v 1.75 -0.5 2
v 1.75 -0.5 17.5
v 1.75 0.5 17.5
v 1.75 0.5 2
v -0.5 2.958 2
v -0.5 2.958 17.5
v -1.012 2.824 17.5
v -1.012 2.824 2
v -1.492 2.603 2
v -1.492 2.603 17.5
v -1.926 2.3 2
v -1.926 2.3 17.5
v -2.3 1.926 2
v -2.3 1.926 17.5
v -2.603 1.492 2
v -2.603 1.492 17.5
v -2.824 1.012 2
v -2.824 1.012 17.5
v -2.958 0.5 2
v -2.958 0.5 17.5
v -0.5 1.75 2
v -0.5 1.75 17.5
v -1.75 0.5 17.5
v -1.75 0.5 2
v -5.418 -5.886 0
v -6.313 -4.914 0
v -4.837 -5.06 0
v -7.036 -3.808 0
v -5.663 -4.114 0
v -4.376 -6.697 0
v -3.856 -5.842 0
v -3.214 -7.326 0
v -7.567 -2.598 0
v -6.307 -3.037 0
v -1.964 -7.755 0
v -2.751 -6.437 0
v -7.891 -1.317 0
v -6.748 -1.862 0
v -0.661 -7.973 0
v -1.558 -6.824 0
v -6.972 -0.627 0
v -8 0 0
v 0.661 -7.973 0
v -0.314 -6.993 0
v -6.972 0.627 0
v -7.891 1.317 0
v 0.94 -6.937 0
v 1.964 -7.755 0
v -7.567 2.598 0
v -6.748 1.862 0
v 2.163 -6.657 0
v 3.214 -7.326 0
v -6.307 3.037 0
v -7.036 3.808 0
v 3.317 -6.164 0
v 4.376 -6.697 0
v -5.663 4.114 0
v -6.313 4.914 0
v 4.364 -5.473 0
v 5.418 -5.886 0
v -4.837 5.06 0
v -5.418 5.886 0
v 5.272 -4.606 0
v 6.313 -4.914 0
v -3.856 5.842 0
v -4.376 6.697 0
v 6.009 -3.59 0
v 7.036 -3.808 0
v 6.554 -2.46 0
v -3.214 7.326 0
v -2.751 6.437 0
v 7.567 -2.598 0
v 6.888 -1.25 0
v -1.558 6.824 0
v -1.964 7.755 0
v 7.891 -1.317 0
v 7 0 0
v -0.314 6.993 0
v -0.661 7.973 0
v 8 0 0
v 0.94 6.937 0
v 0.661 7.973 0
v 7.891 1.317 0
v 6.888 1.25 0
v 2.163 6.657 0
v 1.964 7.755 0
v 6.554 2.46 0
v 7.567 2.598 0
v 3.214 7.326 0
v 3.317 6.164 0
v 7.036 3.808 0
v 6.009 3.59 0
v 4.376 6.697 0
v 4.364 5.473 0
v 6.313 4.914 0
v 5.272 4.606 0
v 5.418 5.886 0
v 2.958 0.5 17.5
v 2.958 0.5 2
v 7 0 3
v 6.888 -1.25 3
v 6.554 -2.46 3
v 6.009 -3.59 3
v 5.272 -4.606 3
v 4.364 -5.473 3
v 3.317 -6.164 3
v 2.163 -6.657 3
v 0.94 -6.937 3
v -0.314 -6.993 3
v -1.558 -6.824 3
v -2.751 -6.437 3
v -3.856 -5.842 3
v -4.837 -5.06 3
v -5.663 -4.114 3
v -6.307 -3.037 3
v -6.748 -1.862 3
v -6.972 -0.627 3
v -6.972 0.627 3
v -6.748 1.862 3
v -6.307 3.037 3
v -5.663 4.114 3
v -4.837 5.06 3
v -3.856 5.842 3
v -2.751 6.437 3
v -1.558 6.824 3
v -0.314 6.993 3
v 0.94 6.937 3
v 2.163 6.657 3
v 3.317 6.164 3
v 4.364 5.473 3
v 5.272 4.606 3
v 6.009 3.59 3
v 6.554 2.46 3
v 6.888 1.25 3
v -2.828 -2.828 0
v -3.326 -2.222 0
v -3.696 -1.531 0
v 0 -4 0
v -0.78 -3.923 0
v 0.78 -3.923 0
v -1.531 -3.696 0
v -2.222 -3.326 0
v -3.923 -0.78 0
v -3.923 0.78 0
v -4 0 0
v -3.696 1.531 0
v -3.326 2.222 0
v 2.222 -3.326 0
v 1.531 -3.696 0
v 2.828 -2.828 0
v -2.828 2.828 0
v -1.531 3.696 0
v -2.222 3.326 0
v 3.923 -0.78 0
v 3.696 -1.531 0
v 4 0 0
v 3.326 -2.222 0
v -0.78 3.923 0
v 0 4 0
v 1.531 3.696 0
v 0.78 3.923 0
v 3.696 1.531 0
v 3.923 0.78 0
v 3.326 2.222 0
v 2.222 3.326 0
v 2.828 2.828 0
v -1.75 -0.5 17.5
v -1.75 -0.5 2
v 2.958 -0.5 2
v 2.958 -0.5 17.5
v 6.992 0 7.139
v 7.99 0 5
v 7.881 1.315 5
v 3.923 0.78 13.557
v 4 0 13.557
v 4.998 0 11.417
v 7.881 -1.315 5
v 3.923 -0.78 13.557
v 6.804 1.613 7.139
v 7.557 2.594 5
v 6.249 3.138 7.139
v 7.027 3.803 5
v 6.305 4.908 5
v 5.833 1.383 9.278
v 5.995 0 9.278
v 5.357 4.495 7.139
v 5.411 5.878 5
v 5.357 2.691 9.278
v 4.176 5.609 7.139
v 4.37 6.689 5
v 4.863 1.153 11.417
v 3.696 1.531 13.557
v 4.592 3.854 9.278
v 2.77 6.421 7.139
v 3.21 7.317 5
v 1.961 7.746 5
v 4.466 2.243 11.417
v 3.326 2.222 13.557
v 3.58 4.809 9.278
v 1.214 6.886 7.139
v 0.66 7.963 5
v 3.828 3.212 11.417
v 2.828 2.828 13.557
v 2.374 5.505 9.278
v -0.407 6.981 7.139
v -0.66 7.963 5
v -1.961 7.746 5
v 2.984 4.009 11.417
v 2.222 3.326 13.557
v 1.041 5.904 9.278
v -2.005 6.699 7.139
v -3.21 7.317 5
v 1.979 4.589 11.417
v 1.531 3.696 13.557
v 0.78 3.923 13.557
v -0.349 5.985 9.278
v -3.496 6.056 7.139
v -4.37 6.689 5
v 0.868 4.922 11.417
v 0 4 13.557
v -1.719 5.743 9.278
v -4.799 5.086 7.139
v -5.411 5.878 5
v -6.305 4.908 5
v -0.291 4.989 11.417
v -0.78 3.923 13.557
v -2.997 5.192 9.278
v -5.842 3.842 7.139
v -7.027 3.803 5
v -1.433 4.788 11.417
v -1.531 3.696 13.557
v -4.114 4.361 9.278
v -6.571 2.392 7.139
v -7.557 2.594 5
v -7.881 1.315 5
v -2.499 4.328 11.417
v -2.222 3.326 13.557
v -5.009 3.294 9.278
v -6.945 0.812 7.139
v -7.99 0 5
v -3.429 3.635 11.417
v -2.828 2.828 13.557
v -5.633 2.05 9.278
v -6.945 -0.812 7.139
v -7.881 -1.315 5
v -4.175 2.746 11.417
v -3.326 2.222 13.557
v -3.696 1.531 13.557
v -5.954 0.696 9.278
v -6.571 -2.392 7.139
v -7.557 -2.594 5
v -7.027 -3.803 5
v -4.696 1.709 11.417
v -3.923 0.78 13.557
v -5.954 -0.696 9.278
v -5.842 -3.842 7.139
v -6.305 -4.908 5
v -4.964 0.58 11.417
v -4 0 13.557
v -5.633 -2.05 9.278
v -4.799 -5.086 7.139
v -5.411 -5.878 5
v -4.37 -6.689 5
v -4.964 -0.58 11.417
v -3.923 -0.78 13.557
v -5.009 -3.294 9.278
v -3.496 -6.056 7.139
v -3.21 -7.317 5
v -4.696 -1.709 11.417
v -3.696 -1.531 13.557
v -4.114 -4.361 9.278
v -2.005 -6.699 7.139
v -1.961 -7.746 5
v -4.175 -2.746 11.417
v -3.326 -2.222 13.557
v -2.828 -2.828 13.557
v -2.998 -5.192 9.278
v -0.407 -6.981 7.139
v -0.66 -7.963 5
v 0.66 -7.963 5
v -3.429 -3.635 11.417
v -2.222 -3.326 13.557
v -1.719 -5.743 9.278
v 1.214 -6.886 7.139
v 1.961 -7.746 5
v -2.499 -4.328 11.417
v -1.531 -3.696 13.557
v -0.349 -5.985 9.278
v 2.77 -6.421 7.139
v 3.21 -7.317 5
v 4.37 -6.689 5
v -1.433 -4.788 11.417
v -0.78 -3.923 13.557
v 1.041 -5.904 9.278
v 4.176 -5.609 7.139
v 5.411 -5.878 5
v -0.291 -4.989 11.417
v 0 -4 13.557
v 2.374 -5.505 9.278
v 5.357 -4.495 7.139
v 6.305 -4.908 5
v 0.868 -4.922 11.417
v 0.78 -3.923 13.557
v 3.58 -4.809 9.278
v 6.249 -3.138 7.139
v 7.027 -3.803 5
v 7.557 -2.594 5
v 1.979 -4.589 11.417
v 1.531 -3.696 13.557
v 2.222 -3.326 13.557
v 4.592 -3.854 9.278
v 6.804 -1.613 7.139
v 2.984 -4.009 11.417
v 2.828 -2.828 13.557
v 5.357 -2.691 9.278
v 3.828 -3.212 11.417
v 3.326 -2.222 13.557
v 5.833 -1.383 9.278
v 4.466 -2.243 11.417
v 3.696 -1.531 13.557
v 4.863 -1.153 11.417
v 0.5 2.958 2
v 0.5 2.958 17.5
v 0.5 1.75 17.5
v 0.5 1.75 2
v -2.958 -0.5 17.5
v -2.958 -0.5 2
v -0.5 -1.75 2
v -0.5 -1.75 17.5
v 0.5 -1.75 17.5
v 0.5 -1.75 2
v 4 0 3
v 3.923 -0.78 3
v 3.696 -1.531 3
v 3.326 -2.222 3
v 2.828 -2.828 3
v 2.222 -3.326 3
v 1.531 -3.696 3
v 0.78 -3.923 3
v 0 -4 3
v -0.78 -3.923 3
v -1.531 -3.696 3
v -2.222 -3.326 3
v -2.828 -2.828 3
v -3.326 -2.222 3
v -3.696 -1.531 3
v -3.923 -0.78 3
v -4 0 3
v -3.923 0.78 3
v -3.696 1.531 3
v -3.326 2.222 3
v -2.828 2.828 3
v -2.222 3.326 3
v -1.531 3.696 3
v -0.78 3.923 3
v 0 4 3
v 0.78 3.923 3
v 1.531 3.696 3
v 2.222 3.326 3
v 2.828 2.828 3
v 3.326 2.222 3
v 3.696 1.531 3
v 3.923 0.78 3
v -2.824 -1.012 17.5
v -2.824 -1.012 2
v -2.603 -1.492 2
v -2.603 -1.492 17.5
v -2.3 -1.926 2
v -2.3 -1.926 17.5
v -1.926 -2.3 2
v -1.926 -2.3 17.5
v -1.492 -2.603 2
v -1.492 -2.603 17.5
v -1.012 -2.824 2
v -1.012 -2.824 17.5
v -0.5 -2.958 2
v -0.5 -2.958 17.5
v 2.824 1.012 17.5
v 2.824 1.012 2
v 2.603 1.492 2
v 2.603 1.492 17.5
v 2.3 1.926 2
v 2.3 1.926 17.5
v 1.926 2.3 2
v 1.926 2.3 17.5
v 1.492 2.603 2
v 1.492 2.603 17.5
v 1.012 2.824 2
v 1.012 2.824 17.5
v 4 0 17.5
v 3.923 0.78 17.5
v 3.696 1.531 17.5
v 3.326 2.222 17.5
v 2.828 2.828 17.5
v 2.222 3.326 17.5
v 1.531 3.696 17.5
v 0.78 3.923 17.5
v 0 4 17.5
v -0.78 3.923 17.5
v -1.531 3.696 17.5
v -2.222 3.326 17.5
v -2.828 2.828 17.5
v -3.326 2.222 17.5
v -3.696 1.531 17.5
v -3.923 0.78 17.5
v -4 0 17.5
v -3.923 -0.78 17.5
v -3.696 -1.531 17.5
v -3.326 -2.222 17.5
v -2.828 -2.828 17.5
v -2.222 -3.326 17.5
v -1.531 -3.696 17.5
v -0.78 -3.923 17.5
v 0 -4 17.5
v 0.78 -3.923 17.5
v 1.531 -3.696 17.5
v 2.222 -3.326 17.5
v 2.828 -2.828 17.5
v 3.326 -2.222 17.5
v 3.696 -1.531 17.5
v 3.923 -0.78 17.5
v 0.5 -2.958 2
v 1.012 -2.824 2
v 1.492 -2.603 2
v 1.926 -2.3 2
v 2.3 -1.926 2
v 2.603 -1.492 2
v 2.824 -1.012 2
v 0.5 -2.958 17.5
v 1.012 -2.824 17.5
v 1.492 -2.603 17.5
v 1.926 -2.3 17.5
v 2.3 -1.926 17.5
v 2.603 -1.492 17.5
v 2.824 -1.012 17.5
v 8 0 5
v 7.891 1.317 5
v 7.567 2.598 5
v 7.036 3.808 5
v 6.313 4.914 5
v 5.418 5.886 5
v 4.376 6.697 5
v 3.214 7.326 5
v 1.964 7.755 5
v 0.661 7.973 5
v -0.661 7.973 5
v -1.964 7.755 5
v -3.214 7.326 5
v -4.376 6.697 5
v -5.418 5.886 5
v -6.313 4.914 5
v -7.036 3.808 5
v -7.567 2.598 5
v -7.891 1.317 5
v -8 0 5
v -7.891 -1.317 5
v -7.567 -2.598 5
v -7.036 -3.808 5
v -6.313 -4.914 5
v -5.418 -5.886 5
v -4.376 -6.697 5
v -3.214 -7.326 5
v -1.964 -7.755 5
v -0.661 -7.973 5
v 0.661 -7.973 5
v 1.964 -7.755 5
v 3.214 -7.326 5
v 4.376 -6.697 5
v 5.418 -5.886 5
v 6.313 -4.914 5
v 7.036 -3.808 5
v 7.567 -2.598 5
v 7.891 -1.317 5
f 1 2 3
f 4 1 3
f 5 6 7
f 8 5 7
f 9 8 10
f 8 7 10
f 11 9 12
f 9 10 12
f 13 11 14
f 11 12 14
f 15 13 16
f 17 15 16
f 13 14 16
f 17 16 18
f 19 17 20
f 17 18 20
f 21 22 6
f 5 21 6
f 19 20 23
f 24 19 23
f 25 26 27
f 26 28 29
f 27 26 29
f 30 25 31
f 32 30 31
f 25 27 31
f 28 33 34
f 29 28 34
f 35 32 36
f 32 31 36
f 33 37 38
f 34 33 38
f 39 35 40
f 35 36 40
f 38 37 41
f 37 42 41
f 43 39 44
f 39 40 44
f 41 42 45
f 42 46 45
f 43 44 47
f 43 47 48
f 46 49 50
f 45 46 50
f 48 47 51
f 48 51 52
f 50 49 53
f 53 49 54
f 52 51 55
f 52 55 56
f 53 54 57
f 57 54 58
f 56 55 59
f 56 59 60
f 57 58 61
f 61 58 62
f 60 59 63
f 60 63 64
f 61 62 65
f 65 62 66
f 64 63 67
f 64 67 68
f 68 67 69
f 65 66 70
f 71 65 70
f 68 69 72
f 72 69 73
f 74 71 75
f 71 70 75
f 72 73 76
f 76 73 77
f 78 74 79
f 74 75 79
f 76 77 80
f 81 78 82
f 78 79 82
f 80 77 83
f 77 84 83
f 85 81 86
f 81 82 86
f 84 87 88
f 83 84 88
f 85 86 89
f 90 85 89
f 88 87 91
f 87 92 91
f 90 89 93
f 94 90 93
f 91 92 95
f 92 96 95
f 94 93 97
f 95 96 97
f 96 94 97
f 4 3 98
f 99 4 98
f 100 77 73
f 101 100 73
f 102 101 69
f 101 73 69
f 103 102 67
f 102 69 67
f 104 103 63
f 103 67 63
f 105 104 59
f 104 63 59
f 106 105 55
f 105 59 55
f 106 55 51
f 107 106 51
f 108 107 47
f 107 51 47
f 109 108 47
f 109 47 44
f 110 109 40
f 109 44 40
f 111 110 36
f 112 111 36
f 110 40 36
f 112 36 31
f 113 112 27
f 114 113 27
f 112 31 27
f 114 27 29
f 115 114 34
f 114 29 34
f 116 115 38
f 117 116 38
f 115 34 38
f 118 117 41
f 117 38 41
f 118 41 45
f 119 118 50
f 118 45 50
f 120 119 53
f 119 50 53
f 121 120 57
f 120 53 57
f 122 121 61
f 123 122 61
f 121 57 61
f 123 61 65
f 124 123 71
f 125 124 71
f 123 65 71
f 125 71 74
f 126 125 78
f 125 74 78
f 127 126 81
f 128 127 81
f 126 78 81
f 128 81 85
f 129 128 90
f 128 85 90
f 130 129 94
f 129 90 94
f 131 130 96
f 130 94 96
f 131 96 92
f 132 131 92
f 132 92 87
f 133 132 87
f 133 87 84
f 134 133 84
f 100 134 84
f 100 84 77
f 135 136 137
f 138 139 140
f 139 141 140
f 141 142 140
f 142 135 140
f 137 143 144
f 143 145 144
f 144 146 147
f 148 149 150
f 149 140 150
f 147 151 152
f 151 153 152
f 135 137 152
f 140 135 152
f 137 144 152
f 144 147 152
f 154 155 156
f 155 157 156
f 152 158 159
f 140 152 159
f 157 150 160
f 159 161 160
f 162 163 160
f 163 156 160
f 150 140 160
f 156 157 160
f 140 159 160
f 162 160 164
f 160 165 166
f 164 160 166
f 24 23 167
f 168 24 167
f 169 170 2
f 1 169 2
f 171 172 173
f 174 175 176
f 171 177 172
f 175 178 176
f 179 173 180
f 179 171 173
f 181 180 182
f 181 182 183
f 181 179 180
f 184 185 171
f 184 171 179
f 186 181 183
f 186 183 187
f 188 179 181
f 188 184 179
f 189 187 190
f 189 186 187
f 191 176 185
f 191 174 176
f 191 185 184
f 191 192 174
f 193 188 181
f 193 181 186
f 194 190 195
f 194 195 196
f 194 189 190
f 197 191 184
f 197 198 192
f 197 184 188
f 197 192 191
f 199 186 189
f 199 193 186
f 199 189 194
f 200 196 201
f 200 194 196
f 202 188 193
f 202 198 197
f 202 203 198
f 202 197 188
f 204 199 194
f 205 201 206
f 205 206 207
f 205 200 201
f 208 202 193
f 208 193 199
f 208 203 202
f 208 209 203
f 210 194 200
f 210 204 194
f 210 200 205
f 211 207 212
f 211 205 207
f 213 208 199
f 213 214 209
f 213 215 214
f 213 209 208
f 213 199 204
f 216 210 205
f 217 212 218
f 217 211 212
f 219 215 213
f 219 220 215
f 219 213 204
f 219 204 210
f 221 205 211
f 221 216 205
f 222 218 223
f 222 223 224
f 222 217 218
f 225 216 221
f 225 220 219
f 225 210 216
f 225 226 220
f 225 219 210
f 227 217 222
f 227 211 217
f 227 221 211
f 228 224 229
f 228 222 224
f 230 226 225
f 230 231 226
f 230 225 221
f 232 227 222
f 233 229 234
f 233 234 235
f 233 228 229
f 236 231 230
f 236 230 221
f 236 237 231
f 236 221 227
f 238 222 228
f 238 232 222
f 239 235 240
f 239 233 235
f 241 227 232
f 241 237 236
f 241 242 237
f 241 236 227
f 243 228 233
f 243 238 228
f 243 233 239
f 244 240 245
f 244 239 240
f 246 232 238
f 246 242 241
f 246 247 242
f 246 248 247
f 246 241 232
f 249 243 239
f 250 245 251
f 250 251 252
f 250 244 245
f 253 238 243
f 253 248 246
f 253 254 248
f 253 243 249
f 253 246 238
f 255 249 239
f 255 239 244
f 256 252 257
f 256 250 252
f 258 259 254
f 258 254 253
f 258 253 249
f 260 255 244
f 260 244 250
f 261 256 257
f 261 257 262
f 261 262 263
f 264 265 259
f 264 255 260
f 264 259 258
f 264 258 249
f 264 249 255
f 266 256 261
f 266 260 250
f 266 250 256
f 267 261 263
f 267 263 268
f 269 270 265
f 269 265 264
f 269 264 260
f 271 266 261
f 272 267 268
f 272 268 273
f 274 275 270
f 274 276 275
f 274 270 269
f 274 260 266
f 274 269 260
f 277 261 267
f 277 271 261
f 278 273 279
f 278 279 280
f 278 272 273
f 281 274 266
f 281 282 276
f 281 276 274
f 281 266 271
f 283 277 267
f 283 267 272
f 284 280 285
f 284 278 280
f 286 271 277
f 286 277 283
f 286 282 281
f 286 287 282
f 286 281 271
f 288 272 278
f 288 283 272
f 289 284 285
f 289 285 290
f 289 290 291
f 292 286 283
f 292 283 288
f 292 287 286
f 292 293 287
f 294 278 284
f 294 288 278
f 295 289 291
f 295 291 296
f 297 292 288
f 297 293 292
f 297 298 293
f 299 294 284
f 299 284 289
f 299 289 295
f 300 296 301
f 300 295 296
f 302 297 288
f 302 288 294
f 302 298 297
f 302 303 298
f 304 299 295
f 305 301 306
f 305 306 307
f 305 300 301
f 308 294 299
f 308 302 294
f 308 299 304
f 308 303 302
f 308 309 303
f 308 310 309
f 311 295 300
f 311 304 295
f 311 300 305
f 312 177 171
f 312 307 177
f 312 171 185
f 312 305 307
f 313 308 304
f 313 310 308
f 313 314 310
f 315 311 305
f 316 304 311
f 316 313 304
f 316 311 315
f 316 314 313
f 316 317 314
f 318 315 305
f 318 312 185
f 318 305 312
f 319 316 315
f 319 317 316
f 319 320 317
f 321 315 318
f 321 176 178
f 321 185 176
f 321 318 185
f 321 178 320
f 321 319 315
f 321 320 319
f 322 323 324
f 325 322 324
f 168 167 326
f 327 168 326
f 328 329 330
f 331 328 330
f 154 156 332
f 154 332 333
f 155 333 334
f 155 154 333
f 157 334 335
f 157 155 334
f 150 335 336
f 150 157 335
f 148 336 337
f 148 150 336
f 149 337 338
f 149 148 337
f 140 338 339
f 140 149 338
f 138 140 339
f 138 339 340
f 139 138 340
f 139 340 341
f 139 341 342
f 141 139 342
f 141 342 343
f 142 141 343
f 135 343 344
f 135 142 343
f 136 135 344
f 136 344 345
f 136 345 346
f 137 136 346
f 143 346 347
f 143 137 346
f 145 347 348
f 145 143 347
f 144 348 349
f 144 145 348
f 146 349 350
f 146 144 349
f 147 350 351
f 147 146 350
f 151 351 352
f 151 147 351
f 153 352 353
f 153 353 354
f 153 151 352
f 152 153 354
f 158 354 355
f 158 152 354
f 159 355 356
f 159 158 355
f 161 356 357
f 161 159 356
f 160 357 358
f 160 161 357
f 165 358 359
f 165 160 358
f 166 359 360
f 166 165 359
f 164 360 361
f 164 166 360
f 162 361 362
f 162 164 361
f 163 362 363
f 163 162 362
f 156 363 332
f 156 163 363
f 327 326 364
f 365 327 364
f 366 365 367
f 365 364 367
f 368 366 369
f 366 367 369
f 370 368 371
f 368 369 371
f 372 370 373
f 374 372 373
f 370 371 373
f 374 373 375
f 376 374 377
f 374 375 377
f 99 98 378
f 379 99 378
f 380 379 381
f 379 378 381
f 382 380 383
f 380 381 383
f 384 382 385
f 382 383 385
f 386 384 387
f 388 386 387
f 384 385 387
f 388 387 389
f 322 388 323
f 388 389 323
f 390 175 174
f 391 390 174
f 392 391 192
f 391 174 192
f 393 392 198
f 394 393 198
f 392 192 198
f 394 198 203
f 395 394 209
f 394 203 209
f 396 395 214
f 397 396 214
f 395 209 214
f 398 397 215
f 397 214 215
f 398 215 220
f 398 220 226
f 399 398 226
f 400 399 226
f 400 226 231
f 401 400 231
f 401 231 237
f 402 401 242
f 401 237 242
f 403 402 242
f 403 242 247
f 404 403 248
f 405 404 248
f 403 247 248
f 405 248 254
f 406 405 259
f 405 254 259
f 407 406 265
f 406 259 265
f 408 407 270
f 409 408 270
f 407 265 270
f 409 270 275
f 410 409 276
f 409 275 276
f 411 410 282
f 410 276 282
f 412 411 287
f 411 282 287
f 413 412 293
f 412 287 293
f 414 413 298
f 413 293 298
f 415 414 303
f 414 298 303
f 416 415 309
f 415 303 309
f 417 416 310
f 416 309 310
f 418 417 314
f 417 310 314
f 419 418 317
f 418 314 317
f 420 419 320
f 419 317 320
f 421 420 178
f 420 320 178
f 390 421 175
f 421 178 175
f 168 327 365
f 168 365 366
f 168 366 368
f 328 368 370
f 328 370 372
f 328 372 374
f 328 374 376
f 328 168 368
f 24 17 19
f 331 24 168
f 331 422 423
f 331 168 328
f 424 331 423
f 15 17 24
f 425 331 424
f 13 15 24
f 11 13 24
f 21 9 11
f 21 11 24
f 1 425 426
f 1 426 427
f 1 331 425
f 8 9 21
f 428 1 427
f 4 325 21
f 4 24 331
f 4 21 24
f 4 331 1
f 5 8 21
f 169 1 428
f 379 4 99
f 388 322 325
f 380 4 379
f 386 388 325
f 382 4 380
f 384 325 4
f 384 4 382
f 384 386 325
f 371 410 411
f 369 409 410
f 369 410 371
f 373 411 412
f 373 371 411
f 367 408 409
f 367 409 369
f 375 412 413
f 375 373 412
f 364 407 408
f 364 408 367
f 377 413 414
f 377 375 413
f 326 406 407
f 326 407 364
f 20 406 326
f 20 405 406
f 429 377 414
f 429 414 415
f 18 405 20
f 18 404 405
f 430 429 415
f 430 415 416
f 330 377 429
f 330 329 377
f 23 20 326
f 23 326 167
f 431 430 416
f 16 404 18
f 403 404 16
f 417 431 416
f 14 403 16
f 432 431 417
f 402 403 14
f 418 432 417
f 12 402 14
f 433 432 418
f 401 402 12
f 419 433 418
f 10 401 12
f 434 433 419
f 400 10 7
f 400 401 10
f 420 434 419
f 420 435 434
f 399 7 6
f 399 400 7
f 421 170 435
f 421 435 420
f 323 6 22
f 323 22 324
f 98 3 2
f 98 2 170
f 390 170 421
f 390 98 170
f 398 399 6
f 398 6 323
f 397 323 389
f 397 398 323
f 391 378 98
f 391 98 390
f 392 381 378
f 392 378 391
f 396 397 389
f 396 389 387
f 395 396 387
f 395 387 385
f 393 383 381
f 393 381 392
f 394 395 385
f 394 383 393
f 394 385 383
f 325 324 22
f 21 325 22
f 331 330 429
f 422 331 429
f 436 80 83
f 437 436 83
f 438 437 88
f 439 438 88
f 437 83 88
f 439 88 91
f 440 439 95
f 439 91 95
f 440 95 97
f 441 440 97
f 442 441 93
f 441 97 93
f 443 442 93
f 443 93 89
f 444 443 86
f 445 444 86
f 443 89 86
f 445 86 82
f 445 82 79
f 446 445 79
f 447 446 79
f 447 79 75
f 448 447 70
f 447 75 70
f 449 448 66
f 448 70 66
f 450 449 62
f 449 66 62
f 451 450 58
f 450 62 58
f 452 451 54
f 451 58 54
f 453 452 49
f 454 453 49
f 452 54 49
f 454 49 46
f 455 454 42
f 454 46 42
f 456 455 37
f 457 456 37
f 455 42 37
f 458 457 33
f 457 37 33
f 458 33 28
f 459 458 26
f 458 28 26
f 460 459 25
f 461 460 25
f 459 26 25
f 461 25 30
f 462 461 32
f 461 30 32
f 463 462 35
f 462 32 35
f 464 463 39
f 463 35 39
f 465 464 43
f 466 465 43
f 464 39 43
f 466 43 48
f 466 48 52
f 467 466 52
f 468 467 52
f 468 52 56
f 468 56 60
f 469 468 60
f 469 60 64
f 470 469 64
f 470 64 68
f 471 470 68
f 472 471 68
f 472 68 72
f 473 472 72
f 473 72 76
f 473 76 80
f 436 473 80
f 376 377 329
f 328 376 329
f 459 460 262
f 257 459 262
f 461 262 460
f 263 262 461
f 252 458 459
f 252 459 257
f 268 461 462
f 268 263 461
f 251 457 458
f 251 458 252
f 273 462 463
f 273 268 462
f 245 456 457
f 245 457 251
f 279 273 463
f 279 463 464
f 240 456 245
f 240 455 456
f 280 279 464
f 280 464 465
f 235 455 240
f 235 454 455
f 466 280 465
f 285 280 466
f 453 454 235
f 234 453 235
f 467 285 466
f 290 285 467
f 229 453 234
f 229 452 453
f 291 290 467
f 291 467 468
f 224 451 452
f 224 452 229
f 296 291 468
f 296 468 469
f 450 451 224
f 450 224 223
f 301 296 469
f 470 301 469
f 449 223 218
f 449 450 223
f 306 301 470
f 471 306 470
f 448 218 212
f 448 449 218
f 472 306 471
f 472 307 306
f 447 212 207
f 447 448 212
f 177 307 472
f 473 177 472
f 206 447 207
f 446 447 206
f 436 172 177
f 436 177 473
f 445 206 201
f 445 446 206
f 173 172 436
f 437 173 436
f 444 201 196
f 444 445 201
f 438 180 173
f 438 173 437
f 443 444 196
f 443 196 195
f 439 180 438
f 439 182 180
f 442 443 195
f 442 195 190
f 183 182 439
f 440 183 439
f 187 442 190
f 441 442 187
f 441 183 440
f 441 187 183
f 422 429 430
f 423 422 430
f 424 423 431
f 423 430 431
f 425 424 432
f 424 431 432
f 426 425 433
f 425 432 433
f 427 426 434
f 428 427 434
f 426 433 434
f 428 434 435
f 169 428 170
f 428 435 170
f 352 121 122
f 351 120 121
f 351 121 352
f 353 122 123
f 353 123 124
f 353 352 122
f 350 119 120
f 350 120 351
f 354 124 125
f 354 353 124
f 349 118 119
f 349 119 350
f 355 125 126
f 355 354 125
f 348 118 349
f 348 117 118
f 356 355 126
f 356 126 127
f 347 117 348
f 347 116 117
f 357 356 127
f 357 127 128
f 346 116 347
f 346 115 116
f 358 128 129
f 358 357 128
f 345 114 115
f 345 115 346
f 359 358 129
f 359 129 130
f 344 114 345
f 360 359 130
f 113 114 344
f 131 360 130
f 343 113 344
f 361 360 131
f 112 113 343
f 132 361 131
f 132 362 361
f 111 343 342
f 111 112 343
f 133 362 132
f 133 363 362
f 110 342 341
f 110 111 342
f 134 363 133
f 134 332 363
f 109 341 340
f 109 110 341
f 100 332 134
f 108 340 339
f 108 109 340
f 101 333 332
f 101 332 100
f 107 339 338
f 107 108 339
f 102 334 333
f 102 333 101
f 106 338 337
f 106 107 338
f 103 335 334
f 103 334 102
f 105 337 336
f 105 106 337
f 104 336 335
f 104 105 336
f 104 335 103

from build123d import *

# Parameters (mm, degrees)
SKETCH005_R     = 8
PAD003_DEPTH    = 5
SKETCH006_R     = 4
PAD004_DEPTH    = 12.5
SKETCH008_R     = 7
SKETCH008_R_2   = 4
POCKET002_DEPTH = 3
POCKET003_DEPTH = 15.5
CHAMFER_ANGLE   = 65
CHAMFER_SIZE    = 3.99


with BuildPart() as part:
    # Sketch005 → Pad003 (new body)
    with BuildSketch(Plane.XY):
        Circle(SKETCH005_R)
    extrude(amount=PAD003_DEPTH)

    # Sketch006 (on Face3 of Pad003) → Pad004 (join)
    with BuildSketch(Plane.XY.offset(5)):
        Circle(SKETCH006_R)
    extrude(amount=PAD004_DEPTH)

    # Sketch008 (on Face2 of Pad004) → Pocket002 (cut)
    with BuildSketch(Plane(origin=(0, 0, 0), x_dir=(1, 0, 0), z_dir=(0, 0, -1))):
        Circle(SKETCH008_R)
        Circle(SKETCH008_R_2, mode=Mode.SUBTRACT)
    extrude(amount=-POCKET002_DEPTH, mode=Mode.SUBTRACT)

    # Sketch007 (on Face5 of Pad004) → Pocket003 (cut)
    with BuildSketch(Plane.XY.offset(17.5)):
        with BuildLine():
            ThreePointArc((-0.5, 2.95804), (-2.12132, 2.12132), (-2.95804, 0.5))
            Line((-2.95804, 0.5), (-1.75, 0.5))
            Line((-1.75, 0.5), (-1.75, -0.5))
            Line((-1.75, -0.5), (-2.95804, -0.5))
            ThreePointArc((-2.95804, -0.5), (-2.12132, -2.12132), (-0.5, -2.95804))
            Line((-0.5, -2.95804), (-0.5, -1.75))
            Line((-0.5, -1.75), (0.5, -1.75))
            Line((0.5, -1.75), (0.5, -2.95804))
            ThreePointArc((0.5, -2.95804), (2.12132, -2.12132), (2.95804, -0.5))
            Line((2.95804, -0.5), (1.75, -0.5))
            Line((1.75, -0.5), (1.75, 0.5))
            Line((1.75, 0.5), (2.95804, 0.5))
            ThreePointArc((2.95804, 0.5), (2.12132, 2.12132), (0.5, 2.95804))
            Line((0.5, 2.95804), (0.5, 1.75))
            Line((0.5, 1.75), (-0.5, 1.75))
            Line((-0.5, 1.75), (-0.5, 2.95804))
        make_face()
    extrude(amount=-POCKET003_DEPTH, mode=Mode.SUBTRACT)

    # Chamfer
    chamfer_edges = [part.edges().sort_by_distance(p)[0] for p in [
        (-4, 0, 5),
    ]]
    chamfer_side = part.faces().sort_by_distance((-7.773726, 0, 5))[0]
    chamfer(chamfer_edges, length=CHAMFER_SIZE, angle=CHAMFER_ANGLE, reference=chamfer_side)


solid = part.part
